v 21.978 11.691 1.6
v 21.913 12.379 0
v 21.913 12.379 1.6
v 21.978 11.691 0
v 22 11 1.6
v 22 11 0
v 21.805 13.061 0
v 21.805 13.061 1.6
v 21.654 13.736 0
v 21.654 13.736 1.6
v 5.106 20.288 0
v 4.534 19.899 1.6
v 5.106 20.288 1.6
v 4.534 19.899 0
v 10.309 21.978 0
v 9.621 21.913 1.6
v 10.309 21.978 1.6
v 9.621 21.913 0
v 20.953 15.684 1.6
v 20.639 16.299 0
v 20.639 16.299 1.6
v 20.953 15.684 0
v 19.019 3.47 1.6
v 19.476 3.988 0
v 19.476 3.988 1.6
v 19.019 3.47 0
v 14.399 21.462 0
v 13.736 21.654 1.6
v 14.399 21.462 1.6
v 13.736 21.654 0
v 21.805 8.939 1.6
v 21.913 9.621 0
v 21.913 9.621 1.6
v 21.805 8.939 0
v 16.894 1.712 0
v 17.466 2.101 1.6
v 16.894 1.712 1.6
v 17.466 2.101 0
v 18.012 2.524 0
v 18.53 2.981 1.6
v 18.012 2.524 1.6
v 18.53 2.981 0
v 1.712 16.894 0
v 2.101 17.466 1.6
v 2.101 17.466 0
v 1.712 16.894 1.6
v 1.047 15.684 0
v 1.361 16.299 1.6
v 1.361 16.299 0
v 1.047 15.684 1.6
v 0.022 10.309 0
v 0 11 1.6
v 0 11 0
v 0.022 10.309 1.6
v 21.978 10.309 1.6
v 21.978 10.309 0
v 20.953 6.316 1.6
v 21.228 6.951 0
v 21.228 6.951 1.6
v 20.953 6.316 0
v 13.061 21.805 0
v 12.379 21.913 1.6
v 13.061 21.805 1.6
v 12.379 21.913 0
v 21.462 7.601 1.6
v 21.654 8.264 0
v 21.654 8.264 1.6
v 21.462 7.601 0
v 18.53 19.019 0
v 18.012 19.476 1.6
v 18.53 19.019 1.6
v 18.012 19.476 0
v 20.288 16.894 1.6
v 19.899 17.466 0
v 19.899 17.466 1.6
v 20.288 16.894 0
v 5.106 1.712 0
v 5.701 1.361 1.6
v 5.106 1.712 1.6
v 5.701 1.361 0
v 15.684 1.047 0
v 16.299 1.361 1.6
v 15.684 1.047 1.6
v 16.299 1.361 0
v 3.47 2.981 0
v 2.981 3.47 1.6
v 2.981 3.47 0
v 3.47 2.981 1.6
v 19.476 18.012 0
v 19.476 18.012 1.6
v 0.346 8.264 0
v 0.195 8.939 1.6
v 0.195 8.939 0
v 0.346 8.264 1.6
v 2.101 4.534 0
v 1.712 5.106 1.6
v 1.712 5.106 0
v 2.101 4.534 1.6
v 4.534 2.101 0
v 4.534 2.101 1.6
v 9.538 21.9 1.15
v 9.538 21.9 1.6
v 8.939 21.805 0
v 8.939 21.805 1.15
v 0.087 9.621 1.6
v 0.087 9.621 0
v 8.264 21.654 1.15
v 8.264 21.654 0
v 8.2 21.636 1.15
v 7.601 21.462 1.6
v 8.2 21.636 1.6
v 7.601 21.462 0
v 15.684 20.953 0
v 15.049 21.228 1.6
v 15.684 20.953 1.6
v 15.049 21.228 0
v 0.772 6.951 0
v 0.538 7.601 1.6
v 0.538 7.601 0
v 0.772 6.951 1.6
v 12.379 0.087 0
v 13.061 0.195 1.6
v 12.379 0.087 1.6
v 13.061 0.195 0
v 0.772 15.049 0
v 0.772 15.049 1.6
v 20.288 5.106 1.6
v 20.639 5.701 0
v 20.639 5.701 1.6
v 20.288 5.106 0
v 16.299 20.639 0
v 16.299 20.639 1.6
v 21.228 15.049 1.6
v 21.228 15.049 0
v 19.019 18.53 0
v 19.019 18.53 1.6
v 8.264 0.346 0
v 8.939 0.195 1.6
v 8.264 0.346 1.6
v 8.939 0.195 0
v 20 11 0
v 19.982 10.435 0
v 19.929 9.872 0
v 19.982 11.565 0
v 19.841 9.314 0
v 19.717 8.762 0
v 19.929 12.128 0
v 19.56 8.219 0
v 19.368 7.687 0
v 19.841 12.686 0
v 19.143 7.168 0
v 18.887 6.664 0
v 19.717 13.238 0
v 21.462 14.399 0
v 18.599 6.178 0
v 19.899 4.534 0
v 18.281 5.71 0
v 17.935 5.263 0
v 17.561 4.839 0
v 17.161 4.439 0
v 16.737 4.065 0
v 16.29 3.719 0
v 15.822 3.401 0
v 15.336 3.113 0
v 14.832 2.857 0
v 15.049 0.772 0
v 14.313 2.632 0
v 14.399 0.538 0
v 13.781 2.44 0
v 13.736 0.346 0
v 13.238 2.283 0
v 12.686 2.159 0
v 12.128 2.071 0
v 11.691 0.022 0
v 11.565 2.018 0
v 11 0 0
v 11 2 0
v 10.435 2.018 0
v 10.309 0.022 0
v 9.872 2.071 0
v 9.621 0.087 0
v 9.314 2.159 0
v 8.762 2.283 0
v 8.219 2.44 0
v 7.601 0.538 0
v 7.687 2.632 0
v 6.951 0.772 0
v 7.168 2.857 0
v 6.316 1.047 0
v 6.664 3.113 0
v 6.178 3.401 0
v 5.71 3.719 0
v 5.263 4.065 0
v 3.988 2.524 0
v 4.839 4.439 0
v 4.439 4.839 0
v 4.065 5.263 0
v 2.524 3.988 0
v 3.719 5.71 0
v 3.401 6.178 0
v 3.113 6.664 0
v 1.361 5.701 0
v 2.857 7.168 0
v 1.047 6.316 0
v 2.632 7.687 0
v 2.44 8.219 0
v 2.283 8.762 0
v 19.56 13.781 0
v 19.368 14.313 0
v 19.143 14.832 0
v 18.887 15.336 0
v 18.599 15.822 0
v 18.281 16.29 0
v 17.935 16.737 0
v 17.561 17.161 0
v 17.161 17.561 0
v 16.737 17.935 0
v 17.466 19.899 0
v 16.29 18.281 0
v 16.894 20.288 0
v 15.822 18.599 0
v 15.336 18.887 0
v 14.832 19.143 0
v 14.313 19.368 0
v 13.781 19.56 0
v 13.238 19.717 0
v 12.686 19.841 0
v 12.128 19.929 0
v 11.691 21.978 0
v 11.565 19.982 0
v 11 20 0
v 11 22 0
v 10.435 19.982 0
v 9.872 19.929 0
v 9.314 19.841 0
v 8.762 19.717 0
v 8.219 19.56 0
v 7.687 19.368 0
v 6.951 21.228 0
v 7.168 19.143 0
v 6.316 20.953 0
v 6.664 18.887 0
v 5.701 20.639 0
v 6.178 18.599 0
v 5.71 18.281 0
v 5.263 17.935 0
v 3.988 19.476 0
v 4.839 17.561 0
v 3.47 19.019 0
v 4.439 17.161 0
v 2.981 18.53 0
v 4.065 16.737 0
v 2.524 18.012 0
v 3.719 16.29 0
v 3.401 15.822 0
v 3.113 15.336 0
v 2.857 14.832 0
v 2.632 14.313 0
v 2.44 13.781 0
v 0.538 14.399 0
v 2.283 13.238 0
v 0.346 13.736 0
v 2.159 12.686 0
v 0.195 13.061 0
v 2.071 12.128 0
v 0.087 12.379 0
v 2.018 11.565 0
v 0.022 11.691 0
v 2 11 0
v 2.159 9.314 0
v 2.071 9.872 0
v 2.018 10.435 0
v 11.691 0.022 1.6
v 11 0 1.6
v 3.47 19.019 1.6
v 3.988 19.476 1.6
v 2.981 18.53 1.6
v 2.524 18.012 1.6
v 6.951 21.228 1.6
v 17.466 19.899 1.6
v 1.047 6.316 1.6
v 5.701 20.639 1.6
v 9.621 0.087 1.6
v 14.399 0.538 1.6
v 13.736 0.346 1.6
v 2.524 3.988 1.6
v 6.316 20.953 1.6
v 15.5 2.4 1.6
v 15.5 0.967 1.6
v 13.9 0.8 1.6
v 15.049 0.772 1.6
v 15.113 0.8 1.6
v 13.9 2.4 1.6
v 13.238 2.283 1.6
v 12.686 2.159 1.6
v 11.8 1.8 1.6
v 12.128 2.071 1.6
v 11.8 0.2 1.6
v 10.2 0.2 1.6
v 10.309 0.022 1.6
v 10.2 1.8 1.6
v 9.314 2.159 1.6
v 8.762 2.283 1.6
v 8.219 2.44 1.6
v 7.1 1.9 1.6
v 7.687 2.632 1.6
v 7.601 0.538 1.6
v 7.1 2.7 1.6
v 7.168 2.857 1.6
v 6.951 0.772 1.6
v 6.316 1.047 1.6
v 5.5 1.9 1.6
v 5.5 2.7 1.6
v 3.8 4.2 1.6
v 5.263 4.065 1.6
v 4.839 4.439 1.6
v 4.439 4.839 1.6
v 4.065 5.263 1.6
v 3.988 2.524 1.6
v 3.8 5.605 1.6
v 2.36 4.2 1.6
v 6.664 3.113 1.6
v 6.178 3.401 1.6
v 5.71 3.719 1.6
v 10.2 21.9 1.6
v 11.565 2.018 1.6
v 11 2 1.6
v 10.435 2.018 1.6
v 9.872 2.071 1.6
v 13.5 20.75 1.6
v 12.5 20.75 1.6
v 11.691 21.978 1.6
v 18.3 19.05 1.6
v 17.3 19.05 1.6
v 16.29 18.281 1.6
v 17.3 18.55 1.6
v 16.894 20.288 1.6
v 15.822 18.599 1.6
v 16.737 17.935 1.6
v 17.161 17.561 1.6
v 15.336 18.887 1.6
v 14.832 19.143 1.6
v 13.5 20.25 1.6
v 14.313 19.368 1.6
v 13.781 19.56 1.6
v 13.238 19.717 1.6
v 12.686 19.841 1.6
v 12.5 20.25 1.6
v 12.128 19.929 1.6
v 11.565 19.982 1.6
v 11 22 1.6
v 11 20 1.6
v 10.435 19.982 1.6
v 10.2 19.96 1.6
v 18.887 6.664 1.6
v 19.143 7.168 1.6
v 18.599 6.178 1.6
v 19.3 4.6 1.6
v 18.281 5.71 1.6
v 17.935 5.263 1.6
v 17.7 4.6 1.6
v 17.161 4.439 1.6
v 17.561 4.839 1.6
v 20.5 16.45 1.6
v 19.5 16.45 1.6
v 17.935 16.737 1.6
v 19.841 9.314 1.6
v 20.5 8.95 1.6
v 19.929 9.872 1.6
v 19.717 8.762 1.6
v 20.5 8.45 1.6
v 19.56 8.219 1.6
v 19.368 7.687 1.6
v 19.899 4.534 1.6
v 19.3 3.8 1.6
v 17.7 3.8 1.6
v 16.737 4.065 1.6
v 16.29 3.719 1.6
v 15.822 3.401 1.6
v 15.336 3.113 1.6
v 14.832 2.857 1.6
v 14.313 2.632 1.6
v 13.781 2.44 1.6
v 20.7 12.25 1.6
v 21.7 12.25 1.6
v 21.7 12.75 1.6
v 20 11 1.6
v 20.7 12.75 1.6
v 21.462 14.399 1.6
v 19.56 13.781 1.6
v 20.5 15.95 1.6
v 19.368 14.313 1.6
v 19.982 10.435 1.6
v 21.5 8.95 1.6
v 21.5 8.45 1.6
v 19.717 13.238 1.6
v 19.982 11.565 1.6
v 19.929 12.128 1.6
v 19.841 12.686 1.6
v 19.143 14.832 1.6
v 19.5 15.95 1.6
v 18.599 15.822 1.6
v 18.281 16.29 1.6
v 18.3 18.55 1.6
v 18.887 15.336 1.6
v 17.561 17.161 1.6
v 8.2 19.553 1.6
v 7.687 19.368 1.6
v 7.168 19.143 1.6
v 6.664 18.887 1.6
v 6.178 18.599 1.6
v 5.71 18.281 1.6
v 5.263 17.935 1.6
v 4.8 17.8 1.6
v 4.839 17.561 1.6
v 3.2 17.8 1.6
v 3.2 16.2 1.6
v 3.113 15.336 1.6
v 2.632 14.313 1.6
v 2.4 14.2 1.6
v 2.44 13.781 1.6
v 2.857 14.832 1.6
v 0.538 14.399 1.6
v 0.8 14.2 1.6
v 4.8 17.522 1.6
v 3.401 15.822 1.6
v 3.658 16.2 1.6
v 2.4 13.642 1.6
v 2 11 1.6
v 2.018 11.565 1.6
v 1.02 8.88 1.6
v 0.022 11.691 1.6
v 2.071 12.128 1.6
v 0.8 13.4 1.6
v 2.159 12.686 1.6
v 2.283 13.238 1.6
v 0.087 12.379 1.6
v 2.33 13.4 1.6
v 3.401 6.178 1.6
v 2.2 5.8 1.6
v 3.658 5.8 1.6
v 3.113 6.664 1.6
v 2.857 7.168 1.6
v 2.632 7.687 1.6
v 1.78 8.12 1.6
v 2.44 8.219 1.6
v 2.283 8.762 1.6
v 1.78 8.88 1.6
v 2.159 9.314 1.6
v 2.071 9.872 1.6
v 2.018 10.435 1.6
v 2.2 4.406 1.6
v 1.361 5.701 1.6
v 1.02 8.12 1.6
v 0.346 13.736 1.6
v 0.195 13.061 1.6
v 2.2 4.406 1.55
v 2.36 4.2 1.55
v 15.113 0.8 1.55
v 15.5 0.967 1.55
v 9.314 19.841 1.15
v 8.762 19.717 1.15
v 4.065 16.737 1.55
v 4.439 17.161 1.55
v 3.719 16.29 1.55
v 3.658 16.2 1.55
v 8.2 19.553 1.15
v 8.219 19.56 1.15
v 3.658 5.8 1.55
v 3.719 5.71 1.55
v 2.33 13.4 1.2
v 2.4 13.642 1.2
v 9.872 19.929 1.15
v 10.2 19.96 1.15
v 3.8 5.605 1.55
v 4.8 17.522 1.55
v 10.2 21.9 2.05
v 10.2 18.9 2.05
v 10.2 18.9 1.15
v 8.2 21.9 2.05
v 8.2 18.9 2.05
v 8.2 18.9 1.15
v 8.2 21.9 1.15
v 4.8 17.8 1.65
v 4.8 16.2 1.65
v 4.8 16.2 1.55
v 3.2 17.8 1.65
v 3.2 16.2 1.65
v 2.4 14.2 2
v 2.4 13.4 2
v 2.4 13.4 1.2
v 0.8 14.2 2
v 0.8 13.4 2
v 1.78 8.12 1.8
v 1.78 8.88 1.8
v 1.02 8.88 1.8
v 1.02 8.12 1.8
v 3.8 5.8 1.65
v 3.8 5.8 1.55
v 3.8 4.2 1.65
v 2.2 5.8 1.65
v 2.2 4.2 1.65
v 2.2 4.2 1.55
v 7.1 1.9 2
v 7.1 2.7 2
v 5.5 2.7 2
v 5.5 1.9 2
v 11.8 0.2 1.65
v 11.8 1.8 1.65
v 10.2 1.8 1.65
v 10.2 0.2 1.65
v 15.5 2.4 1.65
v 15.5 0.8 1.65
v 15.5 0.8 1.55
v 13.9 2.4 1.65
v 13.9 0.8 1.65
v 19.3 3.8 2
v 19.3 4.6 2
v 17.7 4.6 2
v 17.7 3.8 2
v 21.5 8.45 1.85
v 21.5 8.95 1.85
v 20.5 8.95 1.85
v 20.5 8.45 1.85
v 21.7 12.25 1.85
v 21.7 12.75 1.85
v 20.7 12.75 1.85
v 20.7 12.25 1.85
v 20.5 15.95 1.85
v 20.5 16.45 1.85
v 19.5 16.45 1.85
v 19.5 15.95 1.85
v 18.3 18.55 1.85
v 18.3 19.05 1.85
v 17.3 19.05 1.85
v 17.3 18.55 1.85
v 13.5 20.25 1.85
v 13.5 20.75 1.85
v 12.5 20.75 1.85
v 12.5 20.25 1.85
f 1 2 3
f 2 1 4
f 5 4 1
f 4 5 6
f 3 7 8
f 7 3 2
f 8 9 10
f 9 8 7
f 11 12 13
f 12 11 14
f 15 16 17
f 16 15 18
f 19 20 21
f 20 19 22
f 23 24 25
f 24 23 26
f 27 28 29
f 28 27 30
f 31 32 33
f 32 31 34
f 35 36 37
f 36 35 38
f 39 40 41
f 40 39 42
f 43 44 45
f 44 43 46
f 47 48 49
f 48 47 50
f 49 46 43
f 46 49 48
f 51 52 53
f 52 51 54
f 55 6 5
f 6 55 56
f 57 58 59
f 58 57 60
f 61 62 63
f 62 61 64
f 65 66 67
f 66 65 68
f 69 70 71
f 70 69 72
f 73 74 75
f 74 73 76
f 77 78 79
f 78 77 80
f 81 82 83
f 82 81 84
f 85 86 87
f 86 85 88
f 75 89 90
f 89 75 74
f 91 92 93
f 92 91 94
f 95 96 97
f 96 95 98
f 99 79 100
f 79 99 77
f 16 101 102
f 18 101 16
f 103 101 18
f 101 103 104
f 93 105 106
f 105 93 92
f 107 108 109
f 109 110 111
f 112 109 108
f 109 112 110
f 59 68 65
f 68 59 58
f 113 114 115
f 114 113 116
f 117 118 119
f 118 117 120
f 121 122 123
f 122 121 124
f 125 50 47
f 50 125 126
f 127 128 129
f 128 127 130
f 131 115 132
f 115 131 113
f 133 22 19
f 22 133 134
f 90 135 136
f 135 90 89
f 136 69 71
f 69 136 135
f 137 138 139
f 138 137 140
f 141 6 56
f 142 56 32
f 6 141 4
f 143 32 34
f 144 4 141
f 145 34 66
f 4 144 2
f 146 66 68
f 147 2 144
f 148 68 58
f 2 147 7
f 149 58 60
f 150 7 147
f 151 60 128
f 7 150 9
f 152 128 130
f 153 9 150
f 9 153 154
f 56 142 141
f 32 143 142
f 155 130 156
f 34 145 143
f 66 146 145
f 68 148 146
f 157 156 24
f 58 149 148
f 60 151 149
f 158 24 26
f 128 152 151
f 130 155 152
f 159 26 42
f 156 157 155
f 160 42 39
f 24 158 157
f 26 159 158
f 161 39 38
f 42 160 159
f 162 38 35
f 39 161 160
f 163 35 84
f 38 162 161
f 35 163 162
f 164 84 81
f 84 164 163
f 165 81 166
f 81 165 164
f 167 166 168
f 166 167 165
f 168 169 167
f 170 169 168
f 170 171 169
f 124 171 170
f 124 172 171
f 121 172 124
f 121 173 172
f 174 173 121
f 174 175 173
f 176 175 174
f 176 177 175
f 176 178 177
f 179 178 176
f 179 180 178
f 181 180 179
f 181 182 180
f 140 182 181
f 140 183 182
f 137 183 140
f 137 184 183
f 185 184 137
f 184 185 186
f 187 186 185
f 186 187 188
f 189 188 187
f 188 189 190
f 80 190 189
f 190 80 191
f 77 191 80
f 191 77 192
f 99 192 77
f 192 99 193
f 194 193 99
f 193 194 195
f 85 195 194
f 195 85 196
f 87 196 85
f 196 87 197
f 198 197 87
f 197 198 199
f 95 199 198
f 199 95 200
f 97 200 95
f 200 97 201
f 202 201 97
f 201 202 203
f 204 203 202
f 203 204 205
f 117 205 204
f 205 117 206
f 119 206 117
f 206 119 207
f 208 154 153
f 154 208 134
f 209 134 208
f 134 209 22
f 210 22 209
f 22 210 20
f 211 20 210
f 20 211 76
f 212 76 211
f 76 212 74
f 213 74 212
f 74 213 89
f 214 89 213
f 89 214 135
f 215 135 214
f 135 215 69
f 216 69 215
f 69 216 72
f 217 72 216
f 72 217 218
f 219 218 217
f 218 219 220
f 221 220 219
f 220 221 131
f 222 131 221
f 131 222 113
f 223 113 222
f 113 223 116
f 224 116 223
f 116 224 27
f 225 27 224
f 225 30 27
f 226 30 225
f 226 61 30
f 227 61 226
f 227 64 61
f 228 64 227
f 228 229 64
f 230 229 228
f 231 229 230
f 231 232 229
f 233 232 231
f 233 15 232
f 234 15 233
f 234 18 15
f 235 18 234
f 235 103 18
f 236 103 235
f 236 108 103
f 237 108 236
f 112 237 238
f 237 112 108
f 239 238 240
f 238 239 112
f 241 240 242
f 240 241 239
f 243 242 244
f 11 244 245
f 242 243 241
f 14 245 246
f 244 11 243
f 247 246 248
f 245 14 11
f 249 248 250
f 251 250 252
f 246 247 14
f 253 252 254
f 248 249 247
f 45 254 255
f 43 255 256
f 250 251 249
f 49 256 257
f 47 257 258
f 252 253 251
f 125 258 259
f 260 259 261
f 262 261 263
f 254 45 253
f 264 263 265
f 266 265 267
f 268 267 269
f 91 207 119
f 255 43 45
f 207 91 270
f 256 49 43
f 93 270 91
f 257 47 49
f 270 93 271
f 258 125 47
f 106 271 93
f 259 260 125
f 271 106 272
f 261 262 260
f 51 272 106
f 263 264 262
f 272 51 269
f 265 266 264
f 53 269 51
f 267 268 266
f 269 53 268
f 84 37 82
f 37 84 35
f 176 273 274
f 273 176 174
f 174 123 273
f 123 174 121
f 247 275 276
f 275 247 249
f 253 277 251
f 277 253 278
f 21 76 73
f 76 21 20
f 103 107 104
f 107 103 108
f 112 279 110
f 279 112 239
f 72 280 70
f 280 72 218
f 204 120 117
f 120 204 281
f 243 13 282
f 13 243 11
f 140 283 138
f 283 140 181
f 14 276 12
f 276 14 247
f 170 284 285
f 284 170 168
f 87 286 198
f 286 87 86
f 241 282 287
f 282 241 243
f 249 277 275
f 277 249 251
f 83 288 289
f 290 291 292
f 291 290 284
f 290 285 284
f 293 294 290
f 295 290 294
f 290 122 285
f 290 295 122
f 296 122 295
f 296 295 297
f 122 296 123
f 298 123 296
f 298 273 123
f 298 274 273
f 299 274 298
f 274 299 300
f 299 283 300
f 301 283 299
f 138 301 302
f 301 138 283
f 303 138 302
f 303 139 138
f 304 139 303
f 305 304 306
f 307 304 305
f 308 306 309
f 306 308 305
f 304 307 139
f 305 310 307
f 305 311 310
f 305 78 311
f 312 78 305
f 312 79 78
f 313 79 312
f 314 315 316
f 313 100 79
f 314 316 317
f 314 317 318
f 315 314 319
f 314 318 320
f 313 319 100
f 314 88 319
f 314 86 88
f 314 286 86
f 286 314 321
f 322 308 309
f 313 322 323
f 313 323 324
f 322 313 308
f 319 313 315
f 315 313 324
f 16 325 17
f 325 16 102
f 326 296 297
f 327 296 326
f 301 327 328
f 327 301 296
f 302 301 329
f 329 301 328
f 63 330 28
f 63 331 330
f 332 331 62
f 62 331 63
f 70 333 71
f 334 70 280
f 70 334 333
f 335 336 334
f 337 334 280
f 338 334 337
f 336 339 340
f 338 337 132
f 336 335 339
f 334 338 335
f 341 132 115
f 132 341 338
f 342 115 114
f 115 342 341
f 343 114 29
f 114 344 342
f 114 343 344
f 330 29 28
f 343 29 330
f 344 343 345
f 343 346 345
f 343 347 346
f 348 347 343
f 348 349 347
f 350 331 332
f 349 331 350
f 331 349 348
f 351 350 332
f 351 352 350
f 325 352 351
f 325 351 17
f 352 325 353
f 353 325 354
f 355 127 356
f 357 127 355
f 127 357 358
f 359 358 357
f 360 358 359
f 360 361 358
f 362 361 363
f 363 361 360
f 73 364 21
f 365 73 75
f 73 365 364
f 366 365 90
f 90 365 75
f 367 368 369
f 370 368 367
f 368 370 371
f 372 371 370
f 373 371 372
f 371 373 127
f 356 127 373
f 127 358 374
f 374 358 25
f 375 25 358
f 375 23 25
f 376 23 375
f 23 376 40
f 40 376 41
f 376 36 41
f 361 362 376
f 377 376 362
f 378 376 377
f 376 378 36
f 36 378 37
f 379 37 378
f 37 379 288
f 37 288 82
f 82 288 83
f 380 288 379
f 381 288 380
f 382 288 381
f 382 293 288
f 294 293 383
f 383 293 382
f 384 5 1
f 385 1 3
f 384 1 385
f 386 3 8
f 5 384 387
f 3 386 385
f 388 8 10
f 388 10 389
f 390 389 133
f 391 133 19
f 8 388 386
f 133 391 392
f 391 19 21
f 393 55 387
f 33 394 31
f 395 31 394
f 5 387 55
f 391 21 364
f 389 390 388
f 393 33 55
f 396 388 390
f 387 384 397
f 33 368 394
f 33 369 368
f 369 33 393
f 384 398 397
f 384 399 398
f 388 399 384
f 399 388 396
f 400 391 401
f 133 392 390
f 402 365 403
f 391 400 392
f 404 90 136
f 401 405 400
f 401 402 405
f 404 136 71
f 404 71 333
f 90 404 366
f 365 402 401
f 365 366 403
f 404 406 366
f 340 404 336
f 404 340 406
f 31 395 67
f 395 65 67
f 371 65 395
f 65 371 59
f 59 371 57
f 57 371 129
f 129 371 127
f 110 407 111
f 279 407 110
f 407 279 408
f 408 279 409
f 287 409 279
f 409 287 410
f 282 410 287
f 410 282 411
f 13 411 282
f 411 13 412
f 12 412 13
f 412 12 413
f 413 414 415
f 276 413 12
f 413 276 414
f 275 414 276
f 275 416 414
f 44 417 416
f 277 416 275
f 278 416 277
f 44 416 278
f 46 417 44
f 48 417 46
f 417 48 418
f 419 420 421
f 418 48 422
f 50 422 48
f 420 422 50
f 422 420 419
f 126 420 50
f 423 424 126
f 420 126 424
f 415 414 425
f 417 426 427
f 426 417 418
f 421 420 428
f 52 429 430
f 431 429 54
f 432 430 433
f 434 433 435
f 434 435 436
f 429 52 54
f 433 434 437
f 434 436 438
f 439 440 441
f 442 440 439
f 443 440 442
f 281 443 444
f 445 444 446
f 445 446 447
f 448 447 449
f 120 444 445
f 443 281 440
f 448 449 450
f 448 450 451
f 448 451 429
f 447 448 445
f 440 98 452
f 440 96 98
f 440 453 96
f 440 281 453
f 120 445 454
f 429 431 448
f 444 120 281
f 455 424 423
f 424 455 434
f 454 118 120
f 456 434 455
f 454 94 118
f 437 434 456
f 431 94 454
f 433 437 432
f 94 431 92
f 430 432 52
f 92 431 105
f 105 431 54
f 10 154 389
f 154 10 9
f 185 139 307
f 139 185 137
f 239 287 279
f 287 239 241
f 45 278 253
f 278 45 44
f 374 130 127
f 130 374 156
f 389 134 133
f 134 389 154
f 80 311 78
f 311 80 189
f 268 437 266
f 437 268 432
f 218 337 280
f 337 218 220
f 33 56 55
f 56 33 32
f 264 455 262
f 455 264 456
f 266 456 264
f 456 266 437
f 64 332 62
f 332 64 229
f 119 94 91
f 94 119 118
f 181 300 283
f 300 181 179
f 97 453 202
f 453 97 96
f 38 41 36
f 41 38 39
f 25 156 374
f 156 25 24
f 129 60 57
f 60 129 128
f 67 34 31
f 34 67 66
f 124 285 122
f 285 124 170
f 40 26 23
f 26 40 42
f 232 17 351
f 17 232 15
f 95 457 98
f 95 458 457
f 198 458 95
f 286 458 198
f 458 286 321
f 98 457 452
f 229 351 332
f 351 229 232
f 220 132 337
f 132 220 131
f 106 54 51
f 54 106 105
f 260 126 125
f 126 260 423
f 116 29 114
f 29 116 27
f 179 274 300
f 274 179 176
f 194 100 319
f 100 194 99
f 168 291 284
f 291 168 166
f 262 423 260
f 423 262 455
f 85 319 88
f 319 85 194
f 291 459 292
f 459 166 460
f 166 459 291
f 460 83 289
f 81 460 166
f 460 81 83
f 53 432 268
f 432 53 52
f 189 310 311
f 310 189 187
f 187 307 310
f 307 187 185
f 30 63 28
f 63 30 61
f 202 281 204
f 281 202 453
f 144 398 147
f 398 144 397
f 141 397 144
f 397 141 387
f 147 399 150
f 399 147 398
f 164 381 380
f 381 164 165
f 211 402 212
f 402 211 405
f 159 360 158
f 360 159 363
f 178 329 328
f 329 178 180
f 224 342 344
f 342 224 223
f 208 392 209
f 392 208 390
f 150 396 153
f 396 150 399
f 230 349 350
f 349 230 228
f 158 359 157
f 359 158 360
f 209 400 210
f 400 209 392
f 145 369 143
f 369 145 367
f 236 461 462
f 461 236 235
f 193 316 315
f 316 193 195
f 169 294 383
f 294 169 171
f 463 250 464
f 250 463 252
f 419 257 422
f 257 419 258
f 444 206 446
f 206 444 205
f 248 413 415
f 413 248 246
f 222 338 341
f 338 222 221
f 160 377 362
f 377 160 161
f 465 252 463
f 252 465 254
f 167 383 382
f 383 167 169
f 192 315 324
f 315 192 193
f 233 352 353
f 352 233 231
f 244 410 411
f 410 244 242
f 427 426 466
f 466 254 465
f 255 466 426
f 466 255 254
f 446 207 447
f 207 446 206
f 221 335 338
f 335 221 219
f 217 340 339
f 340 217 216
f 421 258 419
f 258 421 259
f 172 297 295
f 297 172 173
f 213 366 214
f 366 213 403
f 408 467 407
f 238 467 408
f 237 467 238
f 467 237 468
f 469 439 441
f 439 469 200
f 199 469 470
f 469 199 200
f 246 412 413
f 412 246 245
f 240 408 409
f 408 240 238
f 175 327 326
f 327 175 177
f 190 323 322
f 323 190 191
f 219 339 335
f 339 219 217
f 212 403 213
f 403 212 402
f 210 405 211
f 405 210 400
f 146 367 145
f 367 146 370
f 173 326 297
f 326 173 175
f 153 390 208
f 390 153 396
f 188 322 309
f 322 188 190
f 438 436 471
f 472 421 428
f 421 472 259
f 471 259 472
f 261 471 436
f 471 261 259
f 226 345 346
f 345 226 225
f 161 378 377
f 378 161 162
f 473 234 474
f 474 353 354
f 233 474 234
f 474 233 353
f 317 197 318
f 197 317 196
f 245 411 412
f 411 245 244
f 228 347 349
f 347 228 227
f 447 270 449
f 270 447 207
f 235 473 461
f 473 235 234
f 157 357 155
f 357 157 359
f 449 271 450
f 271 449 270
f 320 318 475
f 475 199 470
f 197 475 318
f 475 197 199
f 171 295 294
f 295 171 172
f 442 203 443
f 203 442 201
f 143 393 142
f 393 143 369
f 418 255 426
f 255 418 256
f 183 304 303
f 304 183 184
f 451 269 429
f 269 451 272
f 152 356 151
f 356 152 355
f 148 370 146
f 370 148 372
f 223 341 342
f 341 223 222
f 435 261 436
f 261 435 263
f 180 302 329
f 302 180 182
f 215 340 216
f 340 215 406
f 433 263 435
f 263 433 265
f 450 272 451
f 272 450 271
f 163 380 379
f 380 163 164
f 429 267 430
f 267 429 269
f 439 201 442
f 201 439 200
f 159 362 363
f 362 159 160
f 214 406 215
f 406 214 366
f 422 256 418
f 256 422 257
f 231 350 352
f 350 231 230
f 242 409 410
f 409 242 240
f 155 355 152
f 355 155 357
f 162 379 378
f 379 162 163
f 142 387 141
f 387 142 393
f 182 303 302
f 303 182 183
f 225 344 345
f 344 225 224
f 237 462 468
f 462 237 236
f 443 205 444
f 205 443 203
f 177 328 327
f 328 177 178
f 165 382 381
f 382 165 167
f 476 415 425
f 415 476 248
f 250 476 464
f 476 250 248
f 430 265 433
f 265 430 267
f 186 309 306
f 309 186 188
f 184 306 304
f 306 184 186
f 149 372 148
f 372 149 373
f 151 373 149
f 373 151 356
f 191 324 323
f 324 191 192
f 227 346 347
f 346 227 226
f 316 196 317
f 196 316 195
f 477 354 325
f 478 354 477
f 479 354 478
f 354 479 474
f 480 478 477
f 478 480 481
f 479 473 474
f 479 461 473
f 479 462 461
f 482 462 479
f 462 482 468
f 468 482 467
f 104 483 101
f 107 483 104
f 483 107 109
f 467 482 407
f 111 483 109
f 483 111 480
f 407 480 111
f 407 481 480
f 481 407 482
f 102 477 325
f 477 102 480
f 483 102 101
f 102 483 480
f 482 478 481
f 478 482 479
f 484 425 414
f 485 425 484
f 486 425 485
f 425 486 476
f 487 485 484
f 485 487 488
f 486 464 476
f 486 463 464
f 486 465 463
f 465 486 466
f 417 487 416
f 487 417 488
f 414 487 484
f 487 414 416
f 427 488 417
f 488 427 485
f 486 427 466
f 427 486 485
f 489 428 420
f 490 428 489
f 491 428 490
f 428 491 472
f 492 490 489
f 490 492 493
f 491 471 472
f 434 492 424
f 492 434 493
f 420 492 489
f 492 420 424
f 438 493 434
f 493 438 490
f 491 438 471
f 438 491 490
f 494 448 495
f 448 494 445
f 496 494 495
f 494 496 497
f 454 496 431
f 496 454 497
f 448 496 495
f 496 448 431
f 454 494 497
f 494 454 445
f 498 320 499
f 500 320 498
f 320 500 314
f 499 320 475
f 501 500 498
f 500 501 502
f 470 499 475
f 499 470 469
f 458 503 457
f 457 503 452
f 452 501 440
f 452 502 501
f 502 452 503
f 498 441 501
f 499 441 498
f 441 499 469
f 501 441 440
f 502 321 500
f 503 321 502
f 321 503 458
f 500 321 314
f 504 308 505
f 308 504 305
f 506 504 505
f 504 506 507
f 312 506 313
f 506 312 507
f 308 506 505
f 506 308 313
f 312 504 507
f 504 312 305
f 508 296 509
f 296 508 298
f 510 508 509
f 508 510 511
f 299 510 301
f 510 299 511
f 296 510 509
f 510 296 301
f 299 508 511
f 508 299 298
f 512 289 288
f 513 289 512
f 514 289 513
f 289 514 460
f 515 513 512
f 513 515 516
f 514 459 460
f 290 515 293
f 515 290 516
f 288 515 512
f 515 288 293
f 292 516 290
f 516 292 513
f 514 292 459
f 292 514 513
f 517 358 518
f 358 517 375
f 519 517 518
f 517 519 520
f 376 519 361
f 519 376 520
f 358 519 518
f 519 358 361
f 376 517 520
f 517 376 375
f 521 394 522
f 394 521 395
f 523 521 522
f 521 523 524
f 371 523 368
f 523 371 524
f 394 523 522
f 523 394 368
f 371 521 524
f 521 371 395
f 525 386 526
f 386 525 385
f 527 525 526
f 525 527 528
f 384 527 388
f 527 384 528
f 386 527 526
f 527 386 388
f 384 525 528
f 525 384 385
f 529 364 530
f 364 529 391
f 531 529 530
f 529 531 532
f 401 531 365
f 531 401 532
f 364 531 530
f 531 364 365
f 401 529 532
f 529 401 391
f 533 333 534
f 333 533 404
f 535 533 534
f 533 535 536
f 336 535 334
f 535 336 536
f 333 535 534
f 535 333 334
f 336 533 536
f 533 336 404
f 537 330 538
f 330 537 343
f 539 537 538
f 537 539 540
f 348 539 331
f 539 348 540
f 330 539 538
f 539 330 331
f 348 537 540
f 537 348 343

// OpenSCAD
// file: components/ADP150.scad
//https://datasheet.lcsc.com/szlcsc/Analog-Devices-ADI-ADP150ACBZ-3-3-R7_C136038.pdf

ADP150_x = 0.76;
ADP150_y = 0.76;
ADP150_z = 0.4;

//ADP150();
module ADP150(x, y, z, centering) {
    translate([x, y, z])
    cube([ADP150_x, ADP150_y, ADP150_z], centering);
}
// file: components/SMD_Components.scad
//_0804();
//_0603();
//_0402();




module _0804(x, y, z, centering) {
    translate([x, y, z])
    cube([2.0, 1.0, 1.0],centering);
}

module _0603(x, y, z, centering) {
    translate([x, y, z])
    cube([1.6, 0.8, 0.8],centering);
}

module _0402(x, y, z, centering) {
    translate([x, y, z])
    cube([1.0, 0.5, 0.5],centering);
}

module _0201(x, y, z, centering) {
    translate([x, y, z])
    cube([0.6, 0.3, 0.3],centering);
}
// file: components/MCP73831.scad
//https://datasheet.lcsc.com/szlcsc/Microchip-Tech-MCP73831-2ACI-MC_C150772.pdf

MCP73831_x = 2;
MCP73831_y = 3;
MCP73831_z = 0.9;

//MCP73831();

module MCP73831(x, y, z, centering) {
    translate([x, y, z])
    cube([MCP73831_x, MCP73831_y, MCP73831_z], centering);
}
// main file
include <components/MCP73831.scad>
include <components/SMD_Components.scad>
include <components/ADP150.scad>

SLEEK_Power_Ring_diameter_outer = 22;
SLEEK_Power_Ring_diameter_inner = 18;
detail = 100;
h = 1.6;
translate([SLEEK_Power_Ring_diameter_outer/2, SLEEK_Power_Ring_diameter_outer/2 , 0])
SLEEK_Power_Ring();
MCP73831(9.2, 20.4, h, true);
PCB_Pad_Square(4, 17, h, true);
_0603(1.6, 13.8, h, true);
ADP150(1.4, 8.5, h, true);
PCB_Pad_Square(3, 5, h, true);
_0603(6.3, 2.3, h, true);
PCB_Pad_Square(11, 1, h, true);
PCB_Pad_Square(14.7, 1.6, h, true);
_0603(18.5, 4.2, h, true);
_0402(21, 8.7, h, true);
_0402(21.2, 12.5, h, true);
_0402(20, 16.2, h, true);
_0402(17.8, 18.8, h, true);
_0402(13, 20.5, h, true);


module SLEEK_Power_Ring(x, y, z) {
    translate([x, y, z])
    SLEEK_Power_Ring_component();
}

module SLEEK_Power_Ring_component() {
    difference() {
        cylinder(h, d = SLEEK_Power_Ring_diameter_outer, $fn = detail);
        translate([0,0,-1])
            cylinder(h + 2, d = SLEEK_Power_Ring_diameter_inner, $fn = detail);
    }
}

module PCB_Pad_Round(x, y, z, centering) {
    translate([x, y, z])
        cylinder(h = 0.1, d = 1.6, $fn = detail, centering);
}

module PCB_Pad_Square(x, y, z, centering) {
    translate([x, y, z])
        cube([1.6, 1.6, 0.1], centering);
}
